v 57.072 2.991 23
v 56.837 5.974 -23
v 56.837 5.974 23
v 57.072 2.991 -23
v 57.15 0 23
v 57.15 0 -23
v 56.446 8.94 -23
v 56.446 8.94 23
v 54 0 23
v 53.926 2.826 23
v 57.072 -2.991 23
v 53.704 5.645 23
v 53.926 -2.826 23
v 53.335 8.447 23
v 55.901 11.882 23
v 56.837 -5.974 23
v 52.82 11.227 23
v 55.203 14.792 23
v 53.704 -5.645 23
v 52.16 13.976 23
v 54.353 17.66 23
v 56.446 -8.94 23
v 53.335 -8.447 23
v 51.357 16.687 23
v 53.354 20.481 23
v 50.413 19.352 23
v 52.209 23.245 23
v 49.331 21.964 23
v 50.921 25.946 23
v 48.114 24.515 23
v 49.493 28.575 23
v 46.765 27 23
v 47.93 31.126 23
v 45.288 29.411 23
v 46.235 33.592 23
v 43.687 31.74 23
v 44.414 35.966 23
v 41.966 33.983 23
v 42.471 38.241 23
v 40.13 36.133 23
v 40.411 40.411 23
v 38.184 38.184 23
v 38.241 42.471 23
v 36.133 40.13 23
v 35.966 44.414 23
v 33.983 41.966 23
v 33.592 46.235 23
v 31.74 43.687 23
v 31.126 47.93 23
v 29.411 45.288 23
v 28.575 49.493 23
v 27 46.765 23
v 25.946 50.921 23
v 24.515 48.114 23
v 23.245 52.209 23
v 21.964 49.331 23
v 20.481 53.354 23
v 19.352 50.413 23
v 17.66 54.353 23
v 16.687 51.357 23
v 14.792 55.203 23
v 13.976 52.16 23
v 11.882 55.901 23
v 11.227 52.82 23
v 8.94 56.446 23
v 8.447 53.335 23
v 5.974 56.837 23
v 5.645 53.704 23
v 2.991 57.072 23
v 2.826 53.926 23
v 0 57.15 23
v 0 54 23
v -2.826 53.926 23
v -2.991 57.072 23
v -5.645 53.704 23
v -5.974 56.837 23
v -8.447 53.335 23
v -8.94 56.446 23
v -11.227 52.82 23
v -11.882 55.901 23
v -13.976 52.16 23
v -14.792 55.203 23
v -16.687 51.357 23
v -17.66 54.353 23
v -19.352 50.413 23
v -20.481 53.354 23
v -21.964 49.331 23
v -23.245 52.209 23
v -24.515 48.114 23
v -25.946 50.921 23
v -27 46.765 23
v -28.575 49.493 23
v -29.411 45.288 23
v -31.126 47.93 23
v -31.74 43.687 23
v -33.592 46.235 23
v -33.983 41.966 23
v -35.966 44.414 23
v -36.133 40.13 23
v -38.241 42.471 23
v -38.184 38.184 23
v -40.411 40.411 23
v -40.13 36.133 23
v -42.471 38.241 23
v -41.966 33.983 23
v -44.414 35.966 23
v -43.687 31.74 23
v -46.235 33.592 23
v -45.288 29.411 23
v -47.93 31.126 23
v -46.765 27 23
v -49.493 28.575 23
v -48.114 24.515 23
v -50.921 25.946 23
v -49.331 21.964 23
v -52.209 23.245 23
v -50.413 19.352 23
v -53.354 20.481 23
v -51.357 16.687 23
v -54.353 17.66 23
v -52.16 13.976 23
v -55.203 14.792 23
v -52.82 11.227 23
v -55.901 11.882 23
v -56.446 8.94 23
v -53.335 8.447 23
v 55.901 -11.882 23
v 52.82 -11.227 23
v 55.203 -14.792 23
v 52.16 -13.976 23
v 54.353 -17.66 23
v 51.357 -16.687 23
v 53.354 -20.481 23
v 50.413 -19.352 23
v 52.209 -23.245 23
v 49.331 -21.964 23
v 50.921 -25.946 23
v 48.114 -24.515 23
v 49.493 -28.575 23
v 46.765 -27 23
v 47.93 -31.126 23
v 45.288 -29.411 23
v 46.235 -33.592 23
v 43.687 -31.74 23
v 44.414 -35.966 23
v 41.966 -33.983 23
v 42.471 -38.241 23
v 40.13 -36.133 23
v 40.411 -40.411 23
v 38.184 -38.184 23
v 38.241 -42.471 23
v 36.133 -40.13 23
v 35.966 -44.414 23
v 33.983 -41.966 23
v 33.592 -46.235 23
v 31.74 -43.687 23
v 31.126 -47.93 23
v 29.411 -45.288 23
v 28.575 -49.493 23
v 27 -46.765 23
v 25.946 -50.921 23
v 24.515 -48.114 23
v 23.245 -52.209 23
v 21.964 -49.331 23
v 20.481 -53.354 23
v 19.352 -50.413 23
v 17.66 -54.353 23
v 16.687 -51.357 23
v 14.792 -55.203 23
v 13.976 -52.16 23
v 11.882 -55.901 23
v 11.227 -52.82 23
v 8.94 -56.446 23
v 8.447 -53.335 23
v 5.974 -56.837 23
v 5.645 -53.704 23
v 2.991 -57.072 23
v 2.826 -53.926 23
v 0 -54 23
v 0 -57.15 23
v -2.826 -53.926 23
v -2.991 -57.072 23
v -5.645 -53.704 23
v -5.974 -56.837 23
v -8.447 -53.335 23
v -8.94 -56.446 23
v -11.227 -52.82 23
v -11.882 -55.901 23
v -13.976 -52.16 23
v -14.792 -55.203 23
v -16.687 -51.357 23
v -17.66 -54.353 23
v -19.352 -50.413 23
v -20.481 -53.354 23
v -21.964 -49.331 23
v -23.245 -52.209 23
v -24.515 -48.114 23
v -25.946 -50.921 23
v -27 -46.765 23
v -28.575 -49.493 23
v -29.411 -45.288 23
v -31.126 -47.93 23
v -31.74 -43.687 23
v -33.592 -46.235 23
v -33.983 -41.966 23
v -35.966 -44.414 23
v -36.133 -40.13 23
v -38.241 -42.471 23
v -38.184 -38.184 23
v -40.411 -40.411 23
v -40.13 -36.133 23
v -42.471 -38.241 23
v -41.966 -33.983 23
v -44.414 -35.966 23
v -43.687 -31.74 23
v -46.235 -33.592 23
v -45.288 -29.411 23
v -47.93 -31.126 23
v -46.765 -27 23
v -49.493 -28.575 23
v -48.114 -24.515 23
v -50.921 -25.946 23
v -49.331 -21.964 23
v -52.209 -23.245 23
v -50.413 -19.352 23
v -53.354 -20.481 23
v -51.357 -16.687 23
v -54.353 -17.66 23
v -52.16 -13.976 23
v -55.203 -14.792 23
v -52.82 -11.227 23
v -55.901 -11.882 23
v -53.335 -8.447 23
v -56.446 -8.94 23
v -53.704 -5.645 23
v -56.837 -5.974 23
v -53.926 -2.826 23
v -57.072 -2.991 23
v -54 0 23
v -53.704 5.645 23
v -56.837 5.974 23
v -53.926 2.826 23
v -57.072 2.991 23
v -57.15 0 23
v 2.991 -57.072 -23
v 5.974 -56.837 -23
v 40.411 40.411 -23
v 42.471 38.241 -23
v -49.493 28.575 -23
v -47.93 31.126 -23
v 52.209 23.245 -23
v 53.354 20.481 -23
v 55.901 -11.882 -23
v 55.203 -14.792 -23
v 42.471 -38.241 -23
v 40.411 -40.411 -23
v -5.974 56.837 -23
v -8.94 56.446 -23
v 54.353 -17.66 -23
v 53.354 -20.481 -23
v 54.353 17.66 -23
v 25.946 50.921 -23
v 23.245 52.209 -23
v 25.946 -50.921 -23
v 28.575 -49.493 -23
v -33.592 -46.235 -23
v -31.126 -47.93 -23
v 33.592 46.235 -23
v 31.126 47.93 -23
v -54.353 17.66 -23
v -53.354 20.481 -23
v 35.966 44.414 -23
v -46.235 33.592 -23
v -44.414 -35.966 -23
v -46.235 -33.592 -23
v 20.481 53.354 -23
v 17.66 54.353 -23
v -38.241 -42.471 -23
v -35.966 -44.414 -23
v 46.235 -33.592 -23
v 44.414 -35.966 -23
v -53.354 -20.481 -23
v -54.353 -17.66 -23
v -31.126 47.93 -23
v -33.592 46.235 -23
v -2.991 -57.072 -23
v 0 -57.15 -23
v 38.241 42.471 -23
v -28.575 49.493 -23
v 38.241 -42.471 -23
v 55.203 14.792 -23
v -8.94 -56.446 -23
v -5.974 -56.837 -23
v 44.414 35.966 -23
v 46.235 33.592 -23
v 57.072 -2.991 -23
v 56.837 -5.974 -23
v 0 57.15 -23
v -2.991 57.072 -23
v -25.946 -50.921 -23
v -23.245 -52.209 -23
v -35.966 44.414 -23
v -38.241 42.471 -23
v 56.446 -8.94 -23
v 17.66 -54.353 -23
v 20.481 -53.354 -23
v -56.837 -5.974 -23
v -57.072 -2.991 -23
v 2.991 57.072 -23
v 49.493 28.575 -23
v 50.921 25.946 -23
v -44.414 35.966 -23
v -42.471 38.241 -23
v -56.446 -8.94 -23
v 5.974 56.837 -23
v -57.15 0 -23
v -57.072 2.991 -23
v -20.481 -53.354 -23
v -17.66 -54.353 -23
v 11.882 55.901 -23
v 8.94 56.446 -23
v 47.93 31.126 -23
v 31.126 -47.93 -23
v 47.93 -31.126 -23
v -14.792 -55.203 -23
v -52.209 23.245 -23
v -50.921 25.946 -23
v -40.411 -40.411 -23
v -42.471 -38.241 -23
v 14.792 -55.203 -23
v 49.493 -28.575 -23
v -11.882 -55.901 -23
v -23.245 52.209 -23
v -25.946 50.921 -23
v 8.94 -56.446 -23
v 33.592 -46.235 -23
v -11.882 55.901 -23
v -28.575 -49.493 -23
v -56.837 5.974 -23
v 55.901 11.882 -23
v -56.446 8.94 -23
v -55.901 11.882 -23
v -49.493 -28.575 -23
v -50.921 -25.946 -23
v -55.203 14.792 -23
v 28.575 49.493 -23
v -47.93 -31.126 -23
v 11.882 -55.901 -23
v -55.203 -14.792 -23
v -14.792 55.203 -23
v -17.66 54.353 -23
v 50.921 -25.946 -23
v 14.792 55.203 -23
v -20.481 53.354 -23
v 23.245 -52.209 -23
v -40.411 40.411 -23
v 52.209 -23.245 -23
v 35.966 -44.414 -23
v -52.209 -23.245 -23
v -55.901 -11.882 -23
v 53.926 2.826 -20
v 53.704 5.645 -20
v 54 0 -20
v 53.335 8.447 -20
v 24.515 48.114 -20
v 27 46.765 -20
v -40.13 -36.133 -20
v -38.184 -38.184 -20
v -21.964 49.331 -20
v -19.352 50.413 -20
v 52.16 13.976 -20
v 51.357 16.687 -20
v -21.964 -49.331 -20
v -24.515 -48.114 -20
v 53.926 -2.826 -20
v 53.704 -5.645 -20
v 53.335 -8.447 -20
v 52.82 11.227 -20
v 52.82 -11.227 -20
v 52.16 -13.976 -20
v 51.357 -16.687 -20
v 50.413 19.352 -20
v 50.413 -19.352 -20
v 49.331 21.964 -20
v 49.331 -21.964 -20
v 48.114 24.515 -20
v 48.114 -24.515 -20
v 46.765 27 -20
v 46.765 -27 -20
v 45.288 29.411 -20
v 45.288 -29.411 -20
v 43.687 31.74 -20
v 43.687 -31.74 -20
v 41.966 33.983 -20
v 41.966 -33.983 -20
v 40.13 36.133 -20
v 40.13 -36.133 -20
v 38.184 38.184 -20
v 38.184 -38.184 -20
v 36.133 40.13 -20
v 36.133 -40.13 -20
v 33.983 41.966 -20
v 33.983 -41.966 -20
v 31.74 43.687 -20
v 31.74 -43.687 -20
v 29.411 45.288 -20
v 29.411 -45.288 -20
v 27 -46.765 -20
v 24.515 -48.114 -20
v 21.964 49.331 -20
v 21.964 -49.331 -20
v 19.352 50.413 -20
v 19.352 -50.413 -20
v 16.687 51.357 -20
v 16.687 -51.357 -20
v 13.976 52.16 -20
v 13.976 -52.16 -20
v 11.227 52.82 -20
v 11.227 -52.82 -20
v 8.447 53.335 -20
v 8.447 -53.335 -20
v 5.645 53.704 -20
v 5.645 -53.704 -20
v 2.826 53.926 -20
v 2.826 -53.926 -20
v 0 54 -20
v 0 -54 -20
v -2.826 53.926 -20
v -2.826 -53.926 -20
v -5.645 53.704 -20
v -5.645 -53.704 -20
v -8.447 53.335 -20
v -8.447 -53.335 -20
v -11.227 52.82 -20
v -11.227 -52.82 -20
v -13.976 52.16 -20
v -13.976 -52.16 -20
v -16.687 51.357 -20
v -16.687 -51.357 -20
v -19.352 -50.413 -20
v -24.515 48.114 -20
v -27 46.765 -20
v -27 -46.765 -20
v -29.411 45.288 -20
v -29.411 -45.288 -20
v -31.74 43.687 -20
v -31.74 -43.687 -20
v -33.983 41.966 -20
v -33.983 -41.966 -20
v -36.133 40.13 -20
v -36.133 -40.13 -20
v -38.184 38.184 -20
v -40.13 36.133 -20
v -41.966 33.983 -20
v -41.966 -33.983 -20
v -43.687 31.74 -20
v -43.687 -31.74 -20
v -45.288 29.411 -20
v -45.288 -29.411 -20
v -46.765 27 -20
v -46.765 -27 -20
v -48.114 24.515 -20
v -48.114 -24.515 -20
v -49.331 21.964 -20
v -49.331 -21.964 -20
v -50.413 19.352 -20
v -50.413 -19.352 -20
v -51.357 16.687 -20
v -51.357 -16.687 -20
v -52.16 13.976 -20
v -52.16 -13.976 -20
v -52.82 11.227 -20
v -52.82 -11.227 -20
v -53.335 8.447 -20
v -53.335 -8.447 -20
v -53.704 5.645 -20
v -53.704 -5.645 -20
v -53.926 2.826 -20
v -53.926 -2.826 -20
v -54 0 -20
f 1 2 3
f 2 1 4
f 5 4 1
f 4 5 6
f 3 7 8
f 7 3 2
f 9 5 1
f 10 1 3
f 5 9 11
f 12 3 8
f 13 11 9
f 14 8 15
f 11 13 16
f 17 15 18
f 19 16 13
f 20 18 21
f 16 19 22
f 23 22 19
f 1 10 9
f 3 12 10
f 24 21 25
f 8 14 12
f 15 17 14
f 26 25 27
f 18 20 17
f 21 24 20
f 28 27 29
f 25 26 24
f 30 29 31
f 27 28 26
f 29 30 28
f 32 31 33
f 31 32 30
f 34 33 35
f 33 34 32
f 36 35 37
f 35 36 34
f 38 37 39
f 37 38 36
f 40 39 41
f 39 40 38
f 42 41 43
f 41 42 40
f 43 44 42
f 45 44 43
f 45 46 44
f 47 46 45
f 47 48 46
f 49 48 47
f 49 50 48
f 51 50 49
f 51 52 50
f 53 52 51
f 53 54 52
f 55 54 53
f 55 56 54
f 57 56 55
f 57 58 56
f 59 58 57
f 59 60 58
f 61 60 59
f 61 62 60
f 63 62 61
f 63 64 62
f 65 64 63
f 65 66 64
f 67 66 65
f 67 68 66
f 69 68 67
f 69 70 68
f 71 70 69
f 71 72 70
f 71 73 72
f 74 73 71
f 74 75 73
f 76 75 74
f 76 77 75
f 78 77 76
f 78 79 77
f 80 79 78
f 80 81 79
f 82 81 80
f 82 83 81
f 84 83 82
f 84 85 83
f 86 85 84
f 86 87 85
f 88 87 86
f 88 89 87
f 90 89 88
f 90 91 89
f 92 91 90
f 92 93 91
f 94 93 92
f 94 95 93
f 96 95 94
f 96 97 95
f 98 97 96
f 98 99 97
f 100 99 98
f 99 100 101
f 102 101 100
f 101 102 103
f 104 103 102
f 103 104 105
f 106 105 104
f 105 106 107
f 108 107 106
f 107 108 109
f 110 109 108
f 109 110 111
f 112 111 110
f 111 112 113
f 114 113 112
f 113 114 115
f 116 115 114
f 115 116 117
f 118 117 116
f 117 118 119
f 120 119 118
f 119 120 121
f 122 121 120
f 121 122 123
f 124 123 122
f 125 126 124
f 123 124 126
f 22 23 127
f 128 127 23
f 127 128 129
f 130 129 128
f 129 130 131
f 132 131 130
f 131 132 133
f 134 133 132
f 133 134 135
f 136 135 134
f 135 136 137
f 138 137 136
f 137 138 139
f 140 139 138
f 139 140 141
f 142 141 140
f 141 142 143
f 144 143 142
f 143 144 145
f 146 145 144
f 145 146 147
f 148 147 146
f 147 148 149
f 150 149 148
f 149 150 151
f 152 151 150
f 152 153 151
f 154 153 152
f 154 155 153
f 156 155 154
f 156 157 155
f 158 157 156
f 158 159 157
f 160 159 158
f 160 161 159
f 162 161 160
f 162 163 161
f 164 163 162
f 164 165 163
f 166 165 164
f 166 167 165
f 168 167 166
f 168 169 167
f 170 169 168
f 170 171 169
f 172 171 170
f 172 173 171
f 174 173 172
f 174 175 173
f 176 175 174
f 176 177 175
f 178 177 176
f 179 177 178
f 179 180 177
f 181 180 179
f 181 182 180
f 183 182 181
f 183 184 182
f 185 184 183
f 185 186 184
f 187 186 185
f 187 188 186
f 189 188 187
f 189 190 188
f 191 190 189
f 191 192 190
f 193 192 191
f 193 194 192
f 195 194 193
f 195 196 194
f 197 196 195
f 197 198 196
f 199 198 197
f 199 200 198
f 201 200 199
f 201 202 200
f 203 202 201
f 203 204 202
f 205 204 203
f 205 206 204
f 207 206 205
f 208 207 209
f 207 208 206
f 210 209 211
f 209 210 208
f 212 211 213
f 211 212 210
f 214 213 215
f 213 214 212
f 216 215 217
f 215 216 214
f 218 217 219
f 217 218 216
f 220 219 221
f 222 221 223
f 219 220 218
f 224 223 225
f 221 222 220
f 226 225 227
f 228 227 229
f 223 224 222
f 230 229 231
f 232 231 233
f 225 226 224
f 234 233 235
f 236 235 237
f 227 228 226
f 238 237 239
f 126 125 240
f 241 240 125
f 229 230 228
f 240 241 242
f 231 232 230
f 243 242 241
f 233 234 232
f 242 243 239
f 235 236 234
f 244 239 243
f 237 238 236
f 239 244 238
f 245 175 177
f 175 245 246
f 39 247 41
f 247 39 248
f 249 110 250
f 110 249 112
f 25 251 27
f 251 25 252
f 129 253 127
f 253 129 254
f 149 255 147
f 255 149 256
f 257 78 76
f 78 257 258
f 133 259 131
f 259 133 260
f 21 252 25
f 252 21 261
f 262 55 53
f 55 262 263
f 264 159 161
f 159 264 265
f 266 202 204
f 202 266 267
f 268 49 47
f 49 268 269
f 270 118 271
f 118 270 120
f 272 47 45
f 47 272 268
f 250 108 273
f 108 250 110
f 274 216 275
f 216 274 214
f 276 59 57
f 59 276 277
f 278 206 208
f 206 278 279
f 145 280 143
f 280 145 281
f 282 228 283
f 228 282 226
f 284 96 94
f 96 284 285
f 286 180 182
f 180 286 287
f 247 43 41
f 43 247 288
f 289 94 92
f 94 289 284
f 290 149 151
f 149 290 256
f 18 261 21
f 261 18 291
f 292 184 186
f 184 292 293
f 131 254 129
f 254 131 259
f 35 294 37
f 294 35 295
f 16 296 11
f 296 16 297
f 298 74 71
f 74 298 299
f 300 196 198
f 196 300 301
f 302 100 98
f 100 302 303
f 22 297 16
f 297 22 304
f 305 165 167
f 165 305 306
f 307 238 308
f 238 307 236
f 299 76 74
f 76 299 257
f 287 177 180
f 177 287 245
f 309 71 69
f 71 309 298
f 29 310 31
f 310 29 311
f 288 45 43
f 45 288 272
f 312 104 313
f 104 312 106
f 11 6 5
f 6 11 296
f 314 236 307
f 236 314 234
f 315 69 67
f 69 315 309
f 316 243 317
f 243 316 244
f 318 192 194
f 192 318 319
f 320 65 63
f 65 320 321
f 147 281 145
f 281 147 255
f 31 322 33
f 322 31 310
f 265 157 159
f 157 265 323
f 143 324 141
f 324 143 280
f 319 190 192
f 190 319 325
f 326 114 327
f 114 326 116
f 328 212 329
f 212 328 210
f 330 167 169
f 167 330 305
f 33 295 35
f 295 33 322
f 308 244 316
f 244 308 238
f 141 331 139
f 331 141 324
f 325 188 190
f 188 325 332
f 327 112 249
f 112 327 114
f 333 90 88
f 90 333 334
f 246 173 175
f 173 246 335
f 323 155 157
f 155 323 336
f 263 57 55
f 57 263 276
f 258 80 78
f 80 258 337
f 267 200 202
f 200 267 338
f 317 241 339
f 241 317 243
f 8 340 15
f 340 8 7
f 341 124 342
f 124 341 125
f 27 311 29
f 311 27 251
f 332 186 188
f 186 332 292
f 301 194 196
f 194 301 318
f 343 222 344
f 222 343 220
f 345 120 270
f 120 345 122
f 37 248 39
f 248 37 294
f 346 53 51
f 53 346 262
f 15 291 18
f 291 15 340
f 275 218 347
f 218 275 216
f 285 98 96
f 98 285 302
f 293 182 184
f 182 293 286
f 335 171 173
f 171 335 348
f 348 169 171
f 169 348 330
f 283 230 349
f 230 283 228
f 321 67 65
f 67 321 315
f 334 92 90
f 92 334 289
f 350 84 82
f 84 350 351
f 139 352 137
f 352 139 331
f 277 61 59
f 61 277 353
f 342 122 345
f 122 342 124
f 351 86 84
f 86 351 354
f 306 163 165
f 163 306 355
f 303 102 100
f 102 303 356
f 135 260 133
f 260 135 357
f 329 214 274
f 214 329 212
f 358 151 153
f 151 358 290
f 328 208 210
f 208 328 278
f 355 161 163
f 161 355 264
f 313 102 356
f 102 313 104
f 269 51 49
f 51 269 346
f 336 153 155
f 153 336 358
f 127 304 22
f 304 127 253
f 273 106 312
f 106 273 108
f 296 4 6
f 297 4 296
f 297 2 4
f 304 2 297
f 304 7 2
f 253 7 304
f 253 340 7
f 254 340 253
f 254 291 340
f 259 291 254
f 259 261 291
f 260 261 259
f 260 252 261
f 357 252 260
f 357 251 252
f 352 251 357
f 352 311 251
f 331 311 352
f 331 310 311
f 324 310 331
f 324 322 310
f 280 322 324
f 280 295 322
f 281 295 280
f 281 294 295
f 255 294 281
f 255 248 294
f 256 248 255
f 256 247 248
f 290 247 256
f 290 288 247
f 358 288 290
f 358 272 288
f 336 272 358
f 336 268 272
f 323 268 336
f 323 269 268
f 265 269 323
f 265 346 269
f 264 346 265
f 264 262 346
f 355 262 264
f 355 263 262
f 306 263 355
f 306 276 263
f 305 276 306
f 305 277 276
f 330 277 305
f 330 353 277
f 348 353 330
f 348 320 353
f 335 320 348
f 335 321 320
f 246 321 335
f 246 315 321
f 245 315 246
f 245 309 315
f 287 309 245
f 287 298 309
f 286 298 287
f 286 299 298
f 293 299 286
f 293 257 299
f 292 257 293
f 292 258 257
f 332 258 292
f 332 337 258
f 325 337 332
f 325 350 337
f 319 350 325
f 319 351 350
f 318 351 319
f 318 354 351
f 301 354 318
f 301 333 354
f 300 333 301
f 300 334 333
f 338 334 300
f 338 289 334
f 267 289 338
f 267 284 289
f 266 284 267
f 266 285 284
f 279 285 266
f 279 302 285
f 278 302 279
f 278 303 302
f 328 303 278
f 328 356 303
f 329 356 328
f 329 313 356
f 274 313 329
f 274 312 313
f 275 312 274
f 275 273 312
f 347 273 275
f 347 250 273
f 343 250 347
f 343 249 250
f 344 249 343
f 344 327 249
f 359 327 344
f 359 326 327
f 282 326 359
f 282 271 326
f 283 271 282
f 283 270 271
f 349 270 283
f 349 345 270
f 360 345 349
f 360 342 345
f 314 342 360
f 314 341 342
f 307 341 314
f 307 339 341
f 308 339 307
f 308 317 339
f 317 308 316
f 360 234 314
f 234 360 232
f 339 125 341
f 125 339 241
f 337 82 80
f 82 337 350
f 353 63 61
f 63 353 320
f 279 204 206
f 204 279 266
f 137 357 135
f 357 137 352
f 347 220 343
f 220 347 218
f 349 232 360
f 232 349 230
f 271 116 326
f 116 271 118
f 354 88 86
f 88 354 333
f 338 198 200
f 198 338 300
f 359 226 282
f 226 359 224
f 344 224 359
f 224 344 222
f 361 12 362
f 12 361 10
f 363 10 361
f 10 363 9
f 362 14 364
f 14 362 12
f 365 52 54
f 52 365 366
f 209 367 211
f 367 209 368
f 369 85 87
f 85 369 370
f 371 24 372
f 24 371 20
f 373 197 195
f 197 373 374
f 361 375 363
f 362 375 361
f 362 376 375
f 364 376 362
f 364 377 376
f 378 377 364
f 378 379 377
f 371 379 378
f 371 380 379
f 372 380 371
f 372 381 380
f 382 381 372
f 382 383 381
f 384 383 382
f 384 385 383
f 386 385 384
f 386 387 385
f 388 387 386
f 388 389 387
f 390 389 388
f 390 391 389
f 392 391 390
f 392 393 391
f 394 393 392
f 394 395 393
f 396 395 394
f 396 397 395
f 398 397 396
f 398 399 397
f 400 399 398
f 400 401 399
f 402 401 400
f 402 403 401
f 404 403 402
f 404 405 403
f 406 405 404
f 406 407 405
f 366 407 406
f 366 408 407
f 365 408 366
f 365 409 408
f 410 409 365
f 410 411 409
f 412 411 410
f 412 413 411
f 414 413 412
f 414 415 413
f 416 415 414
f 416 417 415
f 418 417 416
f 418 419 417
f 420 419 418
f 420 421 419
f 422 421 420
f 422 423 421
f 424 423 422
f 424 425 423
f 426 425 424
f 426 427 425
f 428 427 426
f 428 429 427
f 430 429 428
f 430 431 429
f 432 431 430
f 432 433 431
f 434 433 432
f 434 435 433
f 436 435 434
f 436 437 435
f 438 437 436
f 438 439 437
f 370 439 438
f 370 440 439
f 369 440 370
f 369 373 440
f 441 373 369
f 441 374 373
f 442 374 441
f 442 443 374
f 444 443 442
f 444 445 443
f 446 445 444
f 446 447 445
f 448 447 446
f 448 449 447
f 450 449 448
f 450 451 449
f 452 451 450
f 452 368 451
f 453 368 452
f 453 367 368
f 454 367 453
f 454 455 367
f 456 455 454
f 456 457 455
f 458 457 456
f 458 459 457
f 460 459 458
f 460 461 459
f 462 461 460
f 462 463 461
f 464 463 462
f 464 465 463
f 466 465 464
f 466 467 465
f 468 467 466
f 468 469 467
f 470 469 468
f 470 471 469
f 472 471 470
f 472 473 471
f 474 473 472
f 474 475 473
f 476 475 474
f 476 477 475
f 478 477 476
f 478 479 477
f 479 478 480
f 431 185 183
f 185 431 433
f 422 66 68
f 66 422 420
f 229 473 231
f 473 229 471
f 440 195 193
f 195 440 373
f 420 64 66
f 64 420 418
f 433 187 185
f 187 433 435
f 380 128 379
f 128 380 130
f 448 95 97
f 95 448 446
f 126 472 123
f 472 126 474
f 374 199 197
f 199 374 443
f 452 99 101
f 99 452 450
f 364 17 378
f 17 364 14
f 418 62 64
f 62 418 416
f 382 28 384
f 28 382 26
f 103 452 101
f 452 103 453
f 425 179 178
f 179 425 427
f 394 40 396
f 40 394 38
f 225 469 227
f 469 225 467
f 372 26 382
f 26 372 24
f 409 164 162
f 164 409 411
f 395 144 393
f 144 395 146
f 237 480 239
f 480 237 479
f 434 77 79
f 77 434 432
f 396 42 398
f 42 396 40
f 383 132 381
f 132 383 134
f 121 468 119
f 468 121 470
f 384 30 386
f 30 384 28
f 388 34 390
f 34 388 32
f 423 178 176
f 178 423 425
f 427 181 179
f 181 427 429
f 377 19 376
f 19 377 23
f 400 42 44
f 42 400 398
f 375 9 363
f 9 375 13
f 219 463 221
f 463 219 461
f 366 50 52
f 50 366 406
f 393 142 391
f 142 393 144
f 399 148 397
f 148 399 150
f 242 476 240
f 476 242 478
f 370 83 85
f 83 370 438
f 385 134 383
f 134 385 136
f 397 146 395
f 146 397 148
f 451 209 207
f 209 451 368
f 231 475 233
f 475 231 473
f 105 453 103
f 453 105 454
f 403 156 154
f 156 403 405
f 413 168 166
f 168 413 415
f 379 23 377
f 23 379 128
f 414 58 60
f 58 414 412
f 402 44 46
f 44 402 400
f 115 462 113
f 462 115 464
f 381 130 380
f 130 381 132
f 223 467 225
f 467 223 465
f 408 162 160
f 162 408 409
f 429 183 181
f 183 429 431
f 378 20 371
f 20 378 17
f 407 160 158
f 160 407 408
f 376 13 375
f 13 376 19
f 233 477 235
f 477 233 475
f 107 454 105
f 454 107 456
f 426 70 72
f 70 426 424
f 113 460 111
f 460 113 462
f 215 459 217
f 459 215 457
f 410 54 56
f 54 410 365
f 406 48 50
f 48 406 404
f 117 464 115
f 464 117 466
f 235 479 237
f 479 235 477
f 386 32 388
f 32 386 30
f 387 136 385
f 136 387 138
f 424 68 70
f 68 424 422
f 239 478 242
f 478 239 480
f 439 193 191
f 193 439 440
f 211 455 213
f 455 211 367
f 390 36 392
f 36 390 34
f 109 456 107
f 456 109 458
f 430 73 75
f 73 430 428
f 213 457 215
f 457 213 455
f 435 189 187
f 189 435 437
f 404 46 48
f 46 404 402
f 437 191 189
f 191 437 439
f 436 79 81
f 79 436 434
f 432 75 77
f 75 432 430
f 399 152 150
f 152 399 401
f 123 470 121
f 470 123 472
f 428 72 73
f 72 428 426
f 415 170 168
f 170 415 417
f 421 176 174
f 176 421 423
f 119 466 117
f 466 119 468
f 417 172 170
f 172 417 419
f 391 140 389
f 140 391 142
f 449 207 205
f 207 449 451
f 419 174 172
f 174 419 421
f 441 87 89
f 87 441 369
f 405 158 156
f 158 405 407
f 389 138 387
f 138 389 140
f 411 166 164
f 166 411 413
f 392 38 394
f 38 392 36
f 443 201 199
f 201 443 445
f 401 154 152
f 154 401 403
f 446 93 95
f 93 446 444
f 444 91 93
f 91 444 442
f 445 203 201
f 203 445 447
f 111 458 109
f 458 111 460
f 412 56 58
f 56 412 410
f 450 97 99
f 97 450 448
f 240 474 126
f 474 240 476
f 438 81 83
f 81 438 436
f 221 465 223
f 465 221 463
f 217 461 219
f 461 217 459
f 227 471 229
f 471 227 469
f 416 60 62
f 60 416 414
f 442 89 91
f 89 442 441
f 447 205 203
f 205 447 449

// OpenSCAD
//dimensions are in mm 
$fn=120;
difference(){
cylinder(h = 46, r=57.15, center = true);
    translate([0,00,-20])
    cylinder(h = 50, r=54, center = false);
}
